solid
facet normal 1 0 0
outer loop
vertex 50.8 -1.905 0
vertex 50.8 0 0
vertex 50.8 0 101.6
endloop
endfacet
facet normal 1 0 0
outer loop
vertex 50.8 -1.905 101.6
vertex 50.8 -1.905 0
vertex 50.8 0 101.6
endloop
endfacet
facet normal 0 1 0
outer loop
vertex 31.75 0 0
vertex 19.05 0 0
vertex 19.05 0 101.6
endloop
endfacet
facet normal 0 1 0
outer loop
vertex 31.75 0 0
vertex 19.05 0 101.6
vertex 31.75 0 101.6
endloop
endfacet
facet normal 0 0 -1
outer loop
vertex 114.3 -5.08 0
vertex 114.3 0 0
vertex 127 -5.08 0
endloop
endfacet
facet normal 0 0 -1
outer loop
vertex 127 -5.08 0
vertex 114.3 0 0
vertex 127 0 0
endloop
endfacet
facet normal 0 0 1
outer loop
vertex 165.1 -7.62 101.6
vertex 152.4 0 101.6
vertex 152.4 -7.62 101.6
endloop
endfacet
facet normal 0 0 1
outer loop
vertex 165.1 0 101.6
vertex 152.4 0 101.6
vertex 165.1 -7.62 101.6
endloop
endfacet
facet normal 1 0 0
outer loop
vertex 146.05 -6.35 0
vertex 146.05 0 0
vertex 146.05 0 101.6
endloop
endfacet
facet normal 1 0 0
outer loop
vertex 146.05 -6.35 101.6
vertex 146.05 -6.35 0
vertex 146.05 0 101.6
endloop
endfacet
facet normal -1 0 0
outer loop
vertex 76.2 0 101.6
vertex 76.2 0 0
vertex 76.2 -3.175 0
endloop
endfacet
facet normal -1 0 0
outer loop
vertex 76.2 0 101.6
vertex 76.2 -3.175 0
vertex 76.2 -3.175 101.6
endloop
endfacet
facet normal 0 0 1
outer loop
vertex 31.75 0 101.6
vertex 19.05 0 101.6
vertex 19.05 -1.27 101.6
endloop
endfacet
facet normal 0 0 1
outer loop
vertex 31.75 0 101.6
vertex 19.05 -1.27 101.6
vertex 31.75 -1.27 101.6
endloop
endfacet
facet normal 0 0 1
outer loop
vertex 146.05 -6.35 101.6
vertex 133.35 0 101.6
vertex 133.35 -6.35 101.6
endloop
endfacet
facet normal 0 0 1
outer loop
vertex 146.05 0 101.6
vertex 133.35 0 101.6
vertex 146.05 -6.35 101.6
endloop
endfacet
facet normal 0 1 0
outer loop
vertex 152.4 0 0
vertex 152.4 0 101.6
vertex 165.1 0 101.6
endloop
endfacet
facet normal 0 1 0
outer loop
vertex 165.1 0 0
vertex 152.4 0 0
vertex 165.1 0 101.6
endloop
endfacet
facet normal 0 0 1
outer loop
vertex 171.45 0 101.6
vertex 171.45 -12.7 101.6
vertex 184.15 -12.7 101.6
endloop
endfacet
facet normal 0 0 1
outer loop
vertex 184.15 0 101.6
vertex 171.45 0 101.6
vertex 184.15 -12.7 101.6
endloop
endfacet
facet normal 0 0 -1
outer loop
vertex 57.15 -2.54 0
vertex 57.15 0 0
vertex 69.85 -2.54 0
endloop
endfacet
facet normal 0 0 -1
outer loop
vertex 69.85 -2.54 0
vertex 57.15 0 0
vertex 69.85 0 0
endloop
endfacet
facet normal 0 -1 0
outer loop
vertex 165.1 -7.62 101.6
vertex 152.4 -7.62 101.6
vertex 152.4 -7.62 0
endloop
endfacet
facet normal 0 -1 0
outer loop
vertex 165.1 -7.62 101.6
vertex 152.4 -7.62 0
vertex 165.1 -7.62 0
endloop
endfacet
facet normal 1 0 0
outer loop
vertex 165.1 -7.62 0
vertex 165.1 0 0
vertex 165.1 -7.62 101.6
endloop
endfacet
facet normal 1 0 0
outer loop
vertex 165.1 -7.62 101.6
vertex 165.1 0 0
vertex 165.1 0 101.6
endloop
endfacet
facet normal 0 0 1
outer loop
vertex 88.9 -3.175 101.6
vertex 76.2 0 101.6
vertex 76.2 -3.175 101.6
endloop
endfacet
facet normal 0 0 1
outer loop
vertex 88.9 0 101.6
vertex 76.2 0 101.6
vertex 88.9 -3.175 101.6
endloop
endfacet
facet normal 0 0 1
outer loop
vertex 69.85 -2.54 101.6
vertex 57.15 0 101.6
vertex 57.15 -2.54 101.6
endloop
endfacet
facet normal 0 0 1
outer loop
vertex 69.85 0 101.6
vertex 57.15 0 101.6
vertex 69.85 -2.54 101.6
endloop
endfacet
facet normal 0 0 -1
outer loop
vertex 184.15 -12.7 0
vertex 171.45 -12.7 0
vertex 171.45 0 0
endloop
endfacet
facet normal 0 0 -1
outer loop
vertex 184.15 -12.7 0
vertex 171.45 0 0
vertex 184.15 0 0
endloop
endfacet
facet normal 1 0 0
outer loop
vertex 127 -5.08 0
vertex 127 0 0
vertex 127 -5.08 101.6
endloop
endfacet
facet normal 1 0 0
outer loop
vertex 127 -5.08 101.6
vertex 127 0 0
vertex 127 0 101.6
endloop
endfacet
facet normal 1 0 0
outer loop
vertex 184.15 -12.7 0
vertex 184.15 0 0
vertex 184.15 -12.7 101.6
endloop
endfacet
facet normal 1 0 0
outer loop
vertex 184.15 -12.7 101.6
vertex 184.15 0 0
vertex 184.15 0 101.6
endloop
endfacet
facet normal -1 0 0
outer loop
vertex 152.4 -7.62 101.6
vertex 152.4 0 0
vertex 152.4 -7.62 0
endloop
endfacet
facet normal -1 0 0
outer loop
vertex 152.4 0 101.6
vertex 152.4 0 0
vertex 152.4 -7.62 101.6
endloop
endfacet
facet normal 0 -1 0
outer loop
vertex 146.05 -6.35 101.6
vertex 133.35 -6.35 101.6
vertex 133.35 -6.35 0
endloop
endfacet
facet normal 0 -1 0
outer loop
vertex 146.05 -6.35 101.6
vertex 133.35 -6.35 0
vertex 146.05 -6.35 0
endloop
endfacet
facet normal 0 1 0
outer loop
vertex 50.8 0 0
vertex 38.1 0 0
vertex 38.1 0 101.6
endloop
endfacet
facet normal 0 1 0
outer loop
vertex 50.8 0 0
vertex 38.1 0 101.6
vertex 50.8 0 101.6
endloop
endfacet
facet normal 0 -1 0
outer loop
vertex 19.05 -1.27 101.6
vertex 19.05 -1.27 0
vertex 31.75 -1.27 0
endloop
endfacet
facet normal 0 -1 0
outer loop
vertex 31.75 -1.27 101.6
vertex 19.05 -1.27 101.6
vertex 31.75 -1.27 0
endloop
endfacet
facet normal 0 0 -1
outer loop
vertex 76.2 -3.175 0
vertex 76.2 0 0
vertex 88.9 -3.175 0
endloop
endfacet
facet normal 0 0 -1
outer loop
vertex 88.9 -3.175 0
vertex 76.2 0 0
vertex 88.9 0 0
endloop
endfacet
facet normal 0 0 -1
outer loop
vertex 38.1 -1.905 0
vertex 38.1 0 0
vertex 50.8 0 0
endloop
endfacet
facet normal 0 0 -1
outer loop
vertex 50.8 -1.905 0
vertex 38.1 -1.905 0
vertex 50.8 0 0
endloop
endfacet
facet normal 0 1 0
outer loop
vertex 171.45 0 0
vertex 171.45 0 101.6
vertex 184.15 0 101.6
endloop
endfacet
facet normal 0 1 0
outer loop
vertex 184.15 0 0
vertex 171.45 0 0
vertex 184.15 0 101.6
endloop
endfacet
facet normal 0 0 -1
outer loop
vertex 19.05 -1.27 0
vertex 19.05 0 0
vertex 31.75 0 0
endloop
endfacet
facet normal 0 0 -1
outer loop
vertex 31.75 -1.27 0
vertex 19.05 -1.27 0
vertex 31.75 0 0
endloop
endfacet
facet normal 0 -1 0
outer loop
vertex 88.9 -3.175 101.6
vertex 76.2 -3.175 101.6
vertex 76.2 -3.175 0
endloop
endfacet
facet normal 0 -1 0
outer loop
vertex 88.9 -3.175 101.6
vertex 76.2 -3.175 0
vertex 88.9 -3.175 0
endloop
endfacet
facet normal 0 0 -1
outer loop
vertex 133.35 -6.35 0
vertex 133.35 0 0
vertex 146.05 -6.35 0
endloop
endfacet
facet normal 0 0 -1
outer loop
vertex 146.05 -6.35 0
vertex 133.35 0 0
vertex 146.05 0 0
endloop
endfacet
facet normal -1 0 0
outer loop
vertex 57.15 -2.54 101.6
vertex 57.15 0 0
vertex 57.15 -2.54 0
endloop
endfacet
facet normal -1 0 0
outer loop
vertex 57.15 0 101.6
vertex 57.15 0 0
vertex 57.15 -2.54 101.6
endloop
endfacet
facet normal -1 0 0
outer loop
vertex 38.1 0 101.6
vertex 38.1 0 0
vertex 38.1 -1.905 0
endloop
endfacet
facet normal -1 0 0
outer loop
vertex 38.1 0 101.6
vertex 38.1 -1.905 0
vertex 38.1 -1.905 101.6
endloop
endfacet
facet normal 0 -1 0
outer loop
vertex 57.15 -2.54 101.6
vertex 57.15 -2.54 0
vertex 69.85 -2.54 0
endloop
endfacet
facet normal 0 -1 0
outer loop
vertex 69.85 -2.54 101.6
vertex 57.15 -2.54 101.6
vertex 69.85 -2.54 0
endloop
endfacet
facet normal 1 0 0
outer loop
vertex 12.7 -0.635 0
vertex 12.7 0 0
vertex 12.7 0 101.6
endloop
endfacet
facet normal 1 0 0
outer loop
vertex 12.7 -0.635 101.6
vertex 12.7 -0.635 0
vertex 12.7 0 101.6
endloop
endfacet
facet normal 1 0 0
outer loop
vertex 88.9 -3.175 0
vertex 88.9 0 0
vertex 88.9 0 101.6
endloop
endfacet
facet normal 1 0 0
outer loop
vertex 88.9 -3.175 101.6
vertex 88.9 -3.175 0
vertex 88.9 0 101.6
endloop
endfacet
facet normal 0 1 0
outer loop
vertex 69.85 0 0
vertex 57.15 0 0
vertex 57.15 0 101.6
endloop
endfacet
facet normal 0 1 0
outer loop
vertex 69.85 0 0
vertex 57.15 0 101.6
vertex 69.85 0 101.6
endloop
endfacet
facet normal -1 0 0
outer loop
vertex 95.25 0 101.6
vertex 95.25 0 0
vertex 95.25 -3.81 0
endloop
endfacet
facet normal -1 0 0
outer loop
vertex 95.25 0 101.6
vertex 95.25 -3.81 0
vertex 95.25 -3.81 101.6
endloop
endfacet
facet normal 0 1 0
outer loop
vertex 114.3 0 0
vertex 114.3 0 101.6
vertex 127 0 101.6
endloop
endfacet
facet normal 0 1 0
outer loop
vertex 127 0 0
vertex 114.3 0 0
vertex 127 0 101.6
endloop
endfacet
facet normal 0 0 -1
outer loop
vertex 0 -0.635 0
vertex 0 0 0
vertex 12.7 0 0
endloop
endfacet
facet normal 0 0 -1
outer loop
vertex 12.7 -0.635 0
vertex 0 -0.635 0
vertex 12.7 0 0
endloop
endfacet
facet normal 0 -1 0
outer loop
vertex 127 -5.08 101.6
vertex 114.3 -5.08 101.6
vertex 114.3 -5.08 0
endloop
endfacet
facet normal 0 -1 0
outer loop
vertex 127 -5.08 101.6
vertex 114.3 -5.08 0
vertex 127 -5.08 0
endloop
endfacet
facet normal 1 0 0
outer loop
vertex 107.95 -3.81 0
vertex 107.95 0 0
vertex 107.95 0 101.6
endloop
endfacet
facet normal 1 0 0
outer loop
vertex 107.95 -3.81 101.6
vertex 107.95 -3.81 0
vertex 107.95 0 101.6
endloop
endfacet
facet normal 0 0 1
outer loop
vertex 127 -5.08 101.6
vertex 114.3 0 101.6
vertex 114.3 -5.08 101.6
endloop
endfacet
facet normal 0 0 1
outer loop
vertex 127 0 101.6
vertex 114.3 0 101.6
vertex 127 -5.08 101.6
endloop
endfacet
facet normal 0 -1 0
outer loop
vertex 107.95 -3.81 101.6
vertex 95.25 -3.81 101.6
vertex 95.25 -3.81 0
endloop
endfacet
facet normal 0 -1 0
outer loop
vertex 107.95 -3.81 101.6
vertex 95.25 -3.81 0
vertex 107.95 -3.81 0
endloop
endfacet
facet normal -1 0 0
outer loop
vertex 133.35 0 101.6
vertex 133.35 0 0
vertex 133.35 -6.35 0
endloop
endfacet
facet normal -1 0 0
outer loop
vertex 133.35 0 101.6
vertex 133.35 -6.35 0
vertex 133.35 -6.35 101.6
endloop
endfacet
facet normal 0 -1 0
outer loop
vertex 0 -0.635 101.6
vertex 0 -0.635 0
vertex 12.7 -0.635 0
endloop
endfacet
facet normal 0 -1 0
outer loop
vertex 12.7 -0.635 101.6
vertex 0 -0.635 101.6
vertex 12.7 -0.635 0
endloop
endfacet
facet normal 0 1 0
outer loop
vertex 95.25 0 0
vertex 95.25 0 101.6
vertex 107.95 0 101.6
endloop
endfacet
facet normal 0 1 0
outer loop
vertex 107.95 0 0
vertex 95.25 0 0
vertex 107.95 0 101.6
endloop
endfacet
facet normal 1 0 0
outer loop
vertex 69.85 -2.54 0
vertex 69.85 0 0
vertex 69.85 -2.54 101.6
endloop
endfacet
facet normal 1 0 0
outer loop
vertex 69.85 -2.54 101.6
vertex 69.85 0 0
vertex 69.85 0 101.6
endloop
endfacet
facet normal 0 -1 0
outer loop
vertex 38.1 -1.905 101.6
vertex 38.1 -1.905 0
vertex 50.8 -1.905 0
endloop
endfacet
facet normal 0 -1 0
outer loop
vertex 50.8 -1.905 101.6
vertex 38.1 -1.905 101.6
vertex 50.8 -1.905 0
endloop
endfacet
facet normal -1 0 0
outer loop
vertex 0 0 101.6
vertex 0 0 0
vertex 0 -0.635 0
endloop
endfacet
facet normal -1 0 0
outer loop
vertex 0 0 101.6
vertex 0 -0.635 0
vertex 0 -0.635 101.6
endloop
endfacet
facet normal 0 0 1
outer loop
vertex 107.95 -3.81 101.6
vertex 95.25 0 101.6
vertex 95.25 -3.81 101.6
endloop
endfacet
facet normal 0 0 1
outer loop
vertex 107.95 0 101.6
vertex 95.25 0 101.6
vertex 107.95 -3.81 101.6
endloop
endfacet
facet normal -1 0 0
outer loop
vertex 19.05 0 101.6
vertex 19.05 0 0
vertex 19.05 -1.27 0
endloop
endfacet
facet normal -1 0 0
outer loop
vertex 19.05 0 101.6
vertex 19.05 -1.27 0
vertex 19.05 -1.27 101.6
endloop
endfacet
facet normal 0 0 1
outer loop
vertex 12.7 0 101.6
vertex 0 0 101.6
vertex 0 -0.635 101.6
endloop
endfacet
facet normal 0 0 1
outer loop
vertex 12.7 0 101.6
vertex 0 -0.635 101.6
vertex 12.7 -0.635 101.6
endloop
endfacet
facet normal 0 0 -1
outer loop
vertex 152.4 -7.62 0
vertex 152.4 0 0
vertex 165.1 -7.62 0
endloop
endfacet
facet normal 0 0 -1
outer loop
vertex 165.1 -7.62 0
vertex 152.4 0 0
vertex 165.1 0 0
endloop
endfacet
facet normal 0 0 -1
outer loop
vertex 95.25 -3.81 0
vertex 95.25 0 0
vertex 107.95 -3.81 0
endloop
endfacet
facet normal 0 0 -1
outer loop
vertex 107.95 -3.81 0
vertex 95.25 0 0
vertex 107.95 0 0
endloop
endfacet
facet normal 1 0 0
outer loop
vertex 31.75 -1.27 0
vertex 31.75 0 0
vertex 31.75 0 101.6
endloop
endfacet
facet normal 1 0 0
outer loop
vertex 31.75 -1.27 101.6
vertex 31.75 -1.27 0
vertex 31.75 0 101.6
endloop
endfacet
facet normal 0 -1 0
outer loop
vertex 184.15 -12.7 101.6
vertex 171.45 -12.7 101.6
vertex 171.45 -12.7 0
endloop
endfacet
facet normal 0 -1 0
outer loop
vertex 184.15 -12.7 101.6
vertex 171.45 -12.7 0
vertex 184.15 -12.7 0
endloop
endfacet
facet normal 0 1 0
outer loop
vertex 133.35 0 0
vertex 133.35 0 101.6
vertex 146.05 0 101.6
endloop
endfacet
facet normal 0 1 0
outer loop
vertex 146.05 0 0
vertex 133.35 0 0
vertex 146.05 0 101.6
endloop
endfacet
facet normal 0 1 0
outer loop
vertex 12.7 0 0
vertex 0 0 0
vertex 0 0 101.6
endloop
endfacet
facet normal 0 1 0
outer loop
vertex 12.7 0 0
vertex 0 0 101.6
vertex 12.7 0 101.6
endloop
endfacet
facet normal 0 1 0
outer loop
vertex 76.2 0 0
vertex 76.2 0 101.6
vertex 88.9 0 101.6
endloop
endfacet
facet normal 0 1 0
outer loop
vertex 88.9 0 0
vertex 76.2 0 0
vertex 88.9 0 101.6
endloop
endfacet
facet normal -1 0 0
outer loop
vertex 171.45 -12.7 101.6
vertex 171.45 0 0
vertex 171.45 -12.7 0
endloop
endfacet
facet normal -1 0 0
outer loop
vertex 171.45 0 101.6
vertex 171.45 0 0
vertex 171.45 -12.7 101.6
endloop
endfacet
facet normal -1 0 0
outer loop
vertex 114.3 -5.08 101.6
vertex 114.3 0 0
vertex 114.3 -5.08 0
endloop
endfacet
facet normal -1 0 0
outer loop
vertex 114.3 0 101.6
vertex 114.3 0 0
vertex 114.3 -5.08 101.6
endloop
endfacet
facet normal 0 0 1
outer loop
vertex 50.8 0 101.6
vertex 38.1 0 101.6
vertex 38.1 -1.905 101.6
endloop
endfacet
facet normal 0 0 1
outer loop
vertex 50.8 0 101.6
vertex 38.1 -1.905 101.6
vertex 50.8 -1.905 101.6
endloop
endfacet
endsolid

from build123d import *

# Parameters (mm, degrees)
F0_W      = 12.7
F0_H      = 101.6
F1_DEPTH  = 0.635
F2_W      = 12.7
F2_H      = 101.6
F3_DEPTH  = 1.27
F4_W      = 12.7
F4_H      = 101.6
F5_DEPTH  = 1.905
F6_W      = 12.7
F6_H      = 101.6
F7_DEPTH  = 2.54
F8_W      = 12.7
F8_H      = 101.6
F9_DEPTH  = 3.175
F10_W     = 12.7
F10_H     = 101.6
F11_DEPTH = 3.81
F12_W     = 12.7
F12_H     = 101.6
F13_DEPTH = 5.08
F14_W     = 12.7
F14_H     = 101.6
F15_DEPTH = 6.35
F16_W     = 12.7
F16_H     = 101.6
F17_DEPTH = 7.62
F18_W     = 12.7
F18_H     = 101.6
F19_DEPTH = 12.7


with BuildPart() as f1:
    # F0 (on Front) → F1 (new body)
    with BuildSketch(Plane.XZ):
        with Locations((6.35, 50.8)):
            Rectangle(F0_W, F0_H)
    extrude(amount=F1_DEPTH)


with BuildPart() as f3:
    # F2 (on Front) → F3 (new body)
    with BuildSketch(Plane.XZ):
        with Locations((25.4, 50.8)):
            Rectangle(F2_W, F2_H)
    extrude(amount=F3_DEPTH)


with BuildPart() as f5:
    # F4 (on Front) → F5 (new body)
    with BuildSketch(Plane.XZ):
        with Locations((44.45, 50.8)):
            Rectangle(F4_W, F4_H)
    extrude(amount=F5_DEPTH)


with BuildPart() as f7:
    # F6 (on Front) → F7 (new body)
    with BuildSketch(Plane.XZ):
        with Locations((63.5, 50.8)):
            Rectangle(F6_W, F6_H)
    extrude(amount=F7_DEPTH)


with BuildPart() as f9:
    # F8 (on Front) → F9 (new body)
    with BuildSketch(Plane.XZ):
        with Locations((82.55, 50.8)):
            Rectangle(F8_W, F8_H)
    extrude(amount=F9_DEPTH)


with BuildPart() as f11:
    # F10 (on Front) → F11 (new body)
    with BuildSketch(Plane.XZ):
        with Locations((101.6, 50.8)):
            Rectangle(F10_W, F10_H)
    extrude(amount=F11_DEPTH)


with BuildPart() as f13:
    # F12 (on Front) → F13 (new body)
    with BuildSketch(Plane.XZ):
        with Locations((120.65, 50.8)):
            Rectangle(F12_W, F12_H)
    extrude(amount=F13_DEPTH)


with BuildPart() as f15:
    # F14 (on Front) → F15 (new body)
    with BuildSketch(Plane.XZ):
        with Locations((139.7, 50.8)):
            Rectangle(F14_W, F14_H)
    extrude(amount=F15_DEPTH)


with BuildPart() as f17:
    # F16 (on Front) → F17 (new body)
    with BuildSketch(Plane.XZ):
        with Locations((158.75, 50.8)):
            Rectangle(F16_W, F16_H)
    extrude(amount=F17_DEPTH)


with BuildPart() as f19:
    # F18 (on Front) → F19 (new body)
    with BuildSketch(Plane.XZ):
        with Locations((177.8, 50.8)):
            Rectangle(F18_W, F18_H)
    extrude(amount=F19_DEPTH)


solid = Compound([f1.part, f3.part, f5.part, f7.part, f9.part, f11.part, f13.part, f15.part, f17.part, f19.part])
